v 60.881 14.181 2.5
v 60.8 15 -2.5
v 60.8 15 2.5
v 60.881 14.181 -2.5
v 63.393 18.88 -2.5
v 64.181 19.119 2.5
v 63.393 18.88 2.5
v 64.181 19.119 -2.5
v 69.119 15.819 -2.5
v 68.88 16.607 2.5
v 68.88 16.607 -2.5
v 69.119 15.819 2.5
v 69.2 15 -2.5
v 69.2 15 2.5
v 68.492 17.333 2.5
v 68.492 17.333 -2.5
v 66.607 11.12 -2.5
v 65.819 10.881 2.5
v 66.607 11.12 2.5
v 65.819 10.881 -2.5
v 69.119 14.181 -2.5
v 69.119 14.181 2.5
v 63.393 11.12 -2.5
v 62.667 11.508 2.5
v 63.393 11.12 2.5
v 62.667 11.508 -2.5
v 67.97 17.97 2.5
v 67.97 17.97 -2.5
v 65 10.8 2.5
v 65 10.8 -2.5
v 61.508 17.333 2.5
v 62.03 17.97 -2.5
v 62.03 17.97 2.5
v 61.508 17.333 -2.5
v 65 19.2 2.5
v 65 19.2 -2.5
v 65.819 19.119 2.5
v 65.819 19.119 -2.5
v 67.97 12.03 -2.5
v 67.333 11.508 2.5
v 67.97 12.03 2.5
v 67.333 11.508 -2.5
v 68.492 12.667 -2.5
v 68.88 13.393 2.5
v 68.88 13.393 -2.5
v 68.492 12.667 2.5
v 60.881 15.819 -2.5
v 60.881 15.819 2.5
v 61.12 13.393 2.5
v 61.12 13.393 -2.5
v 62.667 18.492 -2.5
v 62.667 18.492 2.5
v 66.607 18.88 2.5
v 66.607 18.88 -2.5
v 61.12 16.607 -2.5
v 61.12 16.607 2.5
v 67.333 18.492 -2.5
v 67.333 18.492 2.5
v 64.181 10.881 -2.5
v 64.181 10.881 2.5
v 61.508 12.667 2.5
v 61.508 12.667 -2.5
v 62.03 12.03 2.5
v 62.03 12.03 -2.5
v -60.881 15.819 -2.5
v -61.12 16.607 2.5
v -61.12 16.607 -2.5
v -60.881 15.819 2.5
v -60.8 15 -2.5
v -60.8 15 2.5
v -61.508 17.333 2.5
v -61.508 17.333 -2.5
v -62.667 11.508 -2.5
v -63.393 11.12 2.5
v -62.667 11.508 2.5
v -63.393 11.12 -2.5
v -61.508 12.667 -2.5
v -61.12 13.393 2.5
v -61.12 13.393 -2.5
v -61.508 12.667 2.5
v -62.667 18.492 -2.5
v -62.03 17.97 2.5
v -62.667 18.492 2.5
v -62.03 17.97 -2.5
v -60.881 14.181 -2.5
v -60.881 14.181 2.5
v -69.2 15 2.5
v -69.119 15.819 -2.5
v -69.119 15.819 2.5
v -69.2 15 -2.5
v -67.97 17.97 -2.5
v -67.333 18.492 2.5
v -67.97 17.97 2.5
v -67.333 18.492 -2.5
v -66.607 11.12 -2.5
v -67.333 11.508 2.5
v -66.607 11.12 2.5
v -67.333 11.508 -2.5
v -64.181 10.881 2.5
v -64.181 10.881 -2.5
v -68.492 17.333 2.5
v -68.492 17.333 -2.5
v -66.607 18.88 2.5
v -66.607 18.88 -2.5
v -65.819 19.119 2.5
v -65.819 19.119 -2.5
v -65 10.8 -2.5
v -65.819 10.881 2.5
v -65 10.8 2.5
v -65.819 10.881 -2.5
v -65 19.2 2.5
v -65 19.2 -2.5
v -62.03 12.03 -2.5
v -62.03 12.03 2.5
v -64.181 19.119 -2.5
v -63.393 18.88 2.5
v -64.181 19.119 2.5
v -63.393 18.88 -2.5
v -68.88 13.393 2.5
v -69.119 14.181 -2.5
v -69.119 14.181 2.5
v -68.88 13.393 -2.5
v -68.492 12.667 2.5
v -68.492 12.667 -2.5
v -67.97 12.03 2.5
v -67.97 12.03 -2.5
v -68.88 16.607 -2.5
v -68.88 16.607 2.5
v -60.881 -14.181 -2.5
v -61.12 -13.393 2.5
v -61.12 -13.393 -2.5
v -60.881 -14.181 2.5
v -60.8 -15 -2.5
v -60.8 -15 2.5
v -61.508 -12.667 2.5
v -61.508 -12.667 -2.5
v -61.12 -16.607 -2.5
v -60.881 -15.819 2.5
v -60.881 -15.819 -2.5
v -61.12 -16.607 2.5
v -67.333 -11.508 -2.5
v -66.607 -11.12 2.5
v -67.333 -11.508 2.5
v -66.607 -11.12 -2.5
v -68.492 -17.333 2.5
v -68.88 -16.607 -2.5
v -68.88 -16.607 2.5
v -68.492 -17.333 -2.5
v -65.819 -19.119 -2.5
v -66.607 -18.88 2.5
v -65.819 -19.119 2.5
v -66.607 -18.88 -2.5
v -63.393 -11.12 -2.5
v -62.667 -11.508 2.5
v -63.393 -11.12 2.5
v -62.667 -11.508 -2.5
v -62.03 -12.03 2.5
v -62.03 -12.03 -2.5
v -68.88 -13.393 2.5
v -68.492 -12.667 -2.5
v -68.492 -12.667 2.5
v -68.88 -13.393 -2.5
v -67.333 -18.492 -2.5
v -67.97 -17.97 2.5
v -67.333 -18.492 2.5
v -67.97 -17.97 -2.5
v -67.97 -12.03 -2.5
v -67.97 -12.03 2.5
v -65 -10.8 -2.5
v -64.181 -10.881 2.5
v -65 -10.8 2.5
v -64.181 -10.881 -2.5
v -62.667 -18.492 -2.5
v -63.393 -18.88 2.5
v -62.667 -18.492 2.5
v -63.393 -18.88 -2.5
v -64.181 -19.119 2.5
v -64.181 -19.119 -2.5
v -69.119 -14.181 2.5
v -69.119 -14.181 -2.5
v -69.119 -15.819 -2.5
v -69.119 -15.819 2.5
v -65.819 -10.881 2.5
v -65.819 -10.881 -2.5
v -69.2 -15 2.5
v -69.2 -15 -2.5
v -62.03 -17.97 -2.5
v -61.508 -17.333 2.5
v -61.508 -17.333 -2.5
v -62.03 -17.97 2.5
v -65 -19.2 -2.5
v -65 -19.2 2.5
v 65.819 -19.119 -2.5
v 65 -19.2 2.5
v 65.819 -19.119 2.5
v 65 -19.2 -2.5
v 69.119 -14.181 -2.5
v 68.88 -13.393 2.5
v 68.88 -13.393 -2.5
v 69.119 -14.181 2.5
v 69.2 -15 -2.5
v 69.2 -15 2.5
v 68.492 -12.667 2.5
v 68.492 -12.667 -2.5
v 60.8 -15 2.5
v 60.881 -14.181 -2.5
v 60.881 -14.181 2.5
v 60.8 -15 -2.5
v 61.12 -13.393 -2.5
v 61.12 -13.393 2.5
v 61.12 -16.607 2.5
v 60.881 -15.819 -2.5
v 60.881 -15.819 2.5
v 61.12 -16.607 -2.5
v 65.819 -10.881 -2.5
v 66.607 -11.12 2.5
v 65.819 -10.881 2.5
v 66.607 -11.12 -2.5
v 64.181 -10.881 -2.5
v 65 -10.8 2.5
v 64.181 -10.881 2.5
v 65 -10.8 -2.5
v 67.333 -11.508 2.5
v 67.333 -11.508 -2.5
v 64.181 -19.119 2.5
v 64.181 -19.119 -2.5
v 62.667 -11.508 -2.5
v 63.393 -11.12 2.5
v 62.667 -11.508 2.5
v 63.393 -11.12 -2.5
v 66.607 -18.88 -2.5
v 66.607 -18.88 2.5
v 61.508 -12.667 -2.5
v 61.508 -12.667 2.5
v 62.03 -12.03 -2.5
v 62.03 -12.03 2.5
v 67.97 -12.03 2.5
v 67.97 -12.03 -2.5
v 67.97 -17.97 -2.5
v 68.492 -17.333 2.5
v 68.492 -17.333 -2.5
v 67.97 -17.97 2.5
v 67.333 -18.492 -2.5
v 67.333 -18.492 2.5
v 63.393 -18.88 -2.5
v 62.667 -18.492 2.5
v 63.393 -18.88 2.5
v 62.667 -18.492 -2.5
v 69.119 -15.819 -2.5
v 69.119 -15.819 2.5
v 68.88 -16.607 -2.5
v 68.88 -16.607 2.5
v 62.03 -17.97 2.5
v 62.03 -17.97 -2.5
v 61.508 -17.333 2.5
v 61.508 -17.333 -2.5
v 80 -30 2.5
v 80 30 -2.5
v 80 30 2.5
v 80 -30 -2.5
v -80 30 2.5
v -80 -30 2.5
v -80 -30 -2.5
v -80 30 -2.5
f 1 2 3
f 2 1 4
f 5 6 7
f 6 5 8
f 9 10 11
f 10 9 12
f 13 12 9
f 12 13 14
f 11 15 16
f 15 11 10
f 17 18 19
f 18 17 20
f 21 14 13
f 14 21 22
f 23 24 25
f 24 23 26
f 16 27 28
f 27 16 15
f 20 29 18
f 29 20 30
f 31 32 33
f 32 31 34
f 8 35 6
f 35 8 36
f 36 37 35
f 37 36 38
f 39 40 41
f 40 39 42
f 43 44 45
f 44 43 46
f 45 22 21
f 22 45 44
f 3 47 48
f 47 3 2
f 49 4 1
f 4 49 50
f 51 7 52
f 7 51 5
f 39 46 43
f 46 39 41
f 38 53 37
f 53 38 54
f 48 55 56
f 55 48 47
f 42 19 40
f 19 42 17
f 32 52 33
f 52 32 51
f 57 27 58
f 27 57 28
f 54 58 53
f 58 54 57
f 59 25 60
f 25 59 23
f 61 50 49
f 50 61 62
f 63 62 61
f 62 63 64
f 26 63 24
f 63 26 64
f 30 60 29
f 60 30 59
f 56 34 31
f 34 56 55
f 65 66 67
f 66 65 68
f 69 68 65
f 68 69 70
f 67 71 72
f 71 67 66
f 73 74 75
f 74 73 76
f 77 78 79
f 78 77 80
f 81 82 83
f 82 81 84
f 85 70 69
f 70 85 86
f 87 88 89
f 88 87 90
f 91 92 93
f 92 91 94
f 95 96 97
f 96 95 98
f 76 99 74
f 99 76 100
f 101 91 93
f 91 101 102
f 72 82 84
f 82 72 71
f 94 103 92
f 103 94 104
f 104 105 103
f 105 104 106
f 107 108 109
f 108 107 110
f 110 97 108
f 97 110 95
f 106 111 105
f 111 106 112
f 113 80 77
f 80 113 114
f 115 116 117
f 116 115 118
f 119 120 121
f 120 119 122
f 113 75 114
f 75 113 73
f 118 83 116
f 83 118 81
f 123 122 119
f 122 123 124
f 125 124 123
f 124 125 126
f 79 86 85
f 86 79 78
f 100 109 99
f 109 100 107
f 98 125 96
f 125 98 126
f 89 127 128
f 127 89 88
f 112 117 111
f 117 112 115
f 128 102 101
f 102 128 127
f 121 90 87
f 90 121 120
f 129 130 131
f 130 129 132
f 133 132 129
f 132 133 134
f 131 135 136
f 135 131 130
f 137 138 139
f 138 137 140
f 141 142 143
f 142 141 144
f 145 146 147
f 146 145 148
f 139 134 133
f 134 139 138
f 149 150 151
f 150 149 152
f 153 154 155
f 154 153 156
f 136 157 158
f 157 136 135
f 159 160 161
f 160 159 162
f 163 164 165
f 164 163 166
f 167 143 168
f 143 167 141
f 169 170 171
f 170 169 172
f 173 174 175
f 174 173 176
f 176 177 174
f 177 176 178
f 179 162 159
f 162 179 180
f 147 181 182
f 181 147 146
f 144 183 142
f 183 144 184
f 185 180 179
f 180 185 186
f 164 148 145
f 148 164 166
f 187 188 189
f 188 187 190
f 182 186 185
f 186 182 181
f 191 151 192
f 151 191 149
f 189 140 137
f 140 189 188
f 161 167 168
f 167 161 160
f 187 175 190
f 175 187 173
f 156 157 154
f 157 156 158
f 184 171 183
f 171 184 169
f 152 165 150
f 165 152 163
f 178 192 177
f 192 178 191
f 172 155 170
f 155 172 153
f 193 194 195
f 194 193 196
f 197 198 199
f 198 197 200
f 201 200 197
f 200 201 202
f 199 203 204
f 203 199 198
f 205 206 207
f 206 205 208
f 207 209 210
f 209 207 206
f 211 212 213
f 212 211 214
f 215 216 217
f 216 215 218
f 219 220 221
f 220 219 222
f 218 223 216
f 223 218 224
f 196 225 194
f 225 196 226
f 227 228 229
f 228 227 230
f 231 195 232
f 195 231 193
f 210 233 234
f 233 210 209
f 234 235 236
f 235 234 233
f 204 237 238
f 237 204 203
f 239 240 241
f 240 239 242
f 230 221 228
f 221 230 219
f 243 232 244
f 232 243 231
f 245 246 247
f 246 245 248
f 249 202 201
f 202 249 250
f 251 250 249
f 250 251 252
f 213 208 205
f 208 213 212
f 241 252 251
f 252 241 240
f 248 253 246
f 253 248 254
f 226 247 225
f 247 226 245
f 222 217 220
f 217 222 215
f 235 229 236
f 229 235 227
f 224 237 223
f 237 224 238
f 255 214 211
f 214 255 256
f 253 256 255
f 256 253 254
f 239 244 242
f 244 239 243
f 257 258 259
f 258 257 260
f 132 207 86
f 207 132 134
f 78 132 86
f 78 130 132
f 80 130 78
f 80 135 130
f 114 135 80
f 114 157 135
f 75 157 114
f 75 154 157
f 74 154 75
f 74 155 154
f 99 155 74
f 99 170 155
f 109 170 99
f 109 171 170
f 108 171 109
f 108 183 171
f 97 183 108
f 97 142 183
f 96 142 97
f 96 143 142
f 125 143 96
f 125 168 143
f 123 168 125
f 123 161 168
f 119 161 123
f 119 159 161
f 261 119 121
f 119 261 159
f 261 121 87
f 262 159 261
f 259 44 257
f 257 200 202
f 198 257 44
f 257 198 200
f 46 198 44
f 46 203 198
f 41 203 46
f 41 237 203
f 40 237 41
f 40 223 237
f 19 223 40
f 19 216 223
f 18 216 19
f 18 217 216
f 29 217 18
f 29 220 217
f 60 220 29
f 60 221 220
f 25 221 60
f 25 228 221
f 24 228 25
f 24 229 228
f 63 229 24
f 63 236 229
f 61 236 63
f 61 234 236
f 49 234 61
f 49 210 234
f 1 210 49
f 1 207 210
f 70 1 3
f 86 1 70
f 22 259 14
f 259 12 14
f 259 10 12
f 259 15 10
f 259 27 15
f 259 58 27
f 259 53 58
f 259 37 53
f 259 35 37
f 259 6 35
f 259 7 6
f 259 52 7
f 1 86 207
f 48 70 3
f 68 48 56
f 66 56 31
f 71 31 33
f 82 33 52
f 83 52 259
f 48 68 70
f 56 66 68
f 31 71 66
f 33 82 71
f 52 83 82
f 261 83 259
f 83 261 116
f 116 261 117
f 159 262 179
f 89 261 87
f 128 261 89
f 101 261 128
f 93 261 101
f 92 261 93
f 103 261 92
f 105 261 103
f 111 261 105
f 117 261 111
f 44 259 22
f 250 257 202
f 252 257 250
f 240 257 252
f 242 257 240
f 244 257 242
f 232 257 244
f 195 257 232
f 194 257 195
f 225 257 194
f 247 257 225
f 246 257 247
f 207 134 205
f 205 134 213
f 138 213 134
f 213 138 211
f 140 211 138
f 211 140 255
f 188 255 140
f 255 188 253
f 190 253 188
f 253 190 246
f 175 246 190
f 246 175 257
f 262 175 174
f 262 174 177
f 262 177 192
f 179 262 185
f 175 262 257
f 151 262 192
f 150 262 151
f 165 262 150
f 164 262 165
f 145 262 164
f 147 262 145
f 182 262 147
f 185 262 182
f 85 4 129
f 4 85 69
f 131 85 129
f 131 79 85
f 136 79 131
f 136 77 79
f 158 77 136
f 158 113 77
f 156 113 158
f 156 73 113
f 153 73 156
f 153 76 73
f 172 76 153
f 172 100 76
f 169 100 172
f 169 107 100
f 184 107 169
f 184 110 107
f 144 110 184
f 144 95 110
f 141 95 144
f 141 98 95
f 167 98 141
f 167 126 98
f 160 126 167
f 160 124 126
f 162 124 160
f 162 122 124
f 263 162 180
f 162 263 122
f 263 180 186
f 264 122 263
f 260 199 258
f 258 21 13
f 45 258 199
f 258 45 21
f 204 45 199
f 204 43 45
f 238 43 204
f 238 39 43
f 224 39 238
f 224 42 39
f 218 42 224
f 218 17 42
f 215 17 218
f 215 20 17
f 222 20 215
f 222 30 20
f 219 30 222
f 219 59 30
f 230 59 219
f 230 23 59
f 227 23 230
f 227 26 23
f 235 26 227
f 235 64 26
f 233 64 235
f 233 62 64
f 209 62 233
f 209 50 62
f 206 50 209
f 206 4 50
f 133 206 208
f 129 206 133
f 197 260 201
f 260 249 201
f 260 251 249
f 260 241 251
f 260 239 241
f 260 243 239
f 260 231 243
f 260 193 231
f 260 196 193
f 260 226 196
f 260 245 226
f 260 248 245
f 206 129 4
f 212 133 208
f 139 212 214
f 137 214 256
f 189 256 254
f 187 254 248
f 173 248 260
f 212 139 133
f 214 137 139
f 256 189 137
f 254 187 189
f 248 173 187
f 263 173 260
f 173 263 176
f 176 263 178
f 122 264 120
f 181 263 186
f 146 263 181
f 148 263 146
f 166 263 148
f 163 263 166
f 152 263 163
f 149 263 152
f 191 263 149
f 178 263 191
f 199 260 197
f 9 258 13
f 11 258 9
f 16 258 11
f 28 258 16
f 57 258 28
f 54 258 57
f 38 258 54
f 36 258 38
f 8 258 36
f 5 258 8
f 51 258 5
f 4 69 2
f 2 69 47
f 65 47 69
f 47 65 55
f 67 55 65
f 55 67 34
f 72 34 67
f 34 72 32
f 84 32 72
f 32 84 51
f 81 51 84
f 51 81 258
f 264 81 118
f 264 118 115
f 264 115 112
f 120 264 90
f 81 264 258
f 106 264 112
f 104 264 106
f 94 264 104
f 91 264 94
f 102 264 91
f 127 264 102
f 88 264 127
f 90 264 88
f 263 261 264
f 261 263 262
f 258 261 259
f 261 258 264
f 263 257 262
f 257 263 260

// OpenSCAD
$fn = 32;

// ----------------------------------------------------------------------
// Corner plate 160 x 60 x 5
// 4 holes, centres taken from the edge offset
// ----------------------------------------------------------------------

// --- parameters (mm) ---
plate = [160, 60, 5];  // overall size (x, y, z)
holes = 4;             // number of holes the drawing asks for
hole_d = 8.4;          // hole diameter
edge = 15;             // hole centre offset from the plate edge

// --- derived feature positions (mm) ---
corner_x = plate[0] / 2 - edge;  // = 65   corner hole X
corner_y = plate[1] / 2 - edge;  // = 15   corner hole Y
feature_centers = [
  [corner_x, corner_y],
  [-corner_x, corner_y],
  [-corner_x, -corner_y],
  [corner_x, -corner_y]
];   // hole centres the loop below drills

// plate outline, every hole drilled through with the same cutters
difference() {
  cube(plate, center = true);
  for (centre = feature_centers)
    translate([centre[0], centre[1], 0])
      cylinder(d = hole_d, h = plate[2] + 2, center = true);
}
